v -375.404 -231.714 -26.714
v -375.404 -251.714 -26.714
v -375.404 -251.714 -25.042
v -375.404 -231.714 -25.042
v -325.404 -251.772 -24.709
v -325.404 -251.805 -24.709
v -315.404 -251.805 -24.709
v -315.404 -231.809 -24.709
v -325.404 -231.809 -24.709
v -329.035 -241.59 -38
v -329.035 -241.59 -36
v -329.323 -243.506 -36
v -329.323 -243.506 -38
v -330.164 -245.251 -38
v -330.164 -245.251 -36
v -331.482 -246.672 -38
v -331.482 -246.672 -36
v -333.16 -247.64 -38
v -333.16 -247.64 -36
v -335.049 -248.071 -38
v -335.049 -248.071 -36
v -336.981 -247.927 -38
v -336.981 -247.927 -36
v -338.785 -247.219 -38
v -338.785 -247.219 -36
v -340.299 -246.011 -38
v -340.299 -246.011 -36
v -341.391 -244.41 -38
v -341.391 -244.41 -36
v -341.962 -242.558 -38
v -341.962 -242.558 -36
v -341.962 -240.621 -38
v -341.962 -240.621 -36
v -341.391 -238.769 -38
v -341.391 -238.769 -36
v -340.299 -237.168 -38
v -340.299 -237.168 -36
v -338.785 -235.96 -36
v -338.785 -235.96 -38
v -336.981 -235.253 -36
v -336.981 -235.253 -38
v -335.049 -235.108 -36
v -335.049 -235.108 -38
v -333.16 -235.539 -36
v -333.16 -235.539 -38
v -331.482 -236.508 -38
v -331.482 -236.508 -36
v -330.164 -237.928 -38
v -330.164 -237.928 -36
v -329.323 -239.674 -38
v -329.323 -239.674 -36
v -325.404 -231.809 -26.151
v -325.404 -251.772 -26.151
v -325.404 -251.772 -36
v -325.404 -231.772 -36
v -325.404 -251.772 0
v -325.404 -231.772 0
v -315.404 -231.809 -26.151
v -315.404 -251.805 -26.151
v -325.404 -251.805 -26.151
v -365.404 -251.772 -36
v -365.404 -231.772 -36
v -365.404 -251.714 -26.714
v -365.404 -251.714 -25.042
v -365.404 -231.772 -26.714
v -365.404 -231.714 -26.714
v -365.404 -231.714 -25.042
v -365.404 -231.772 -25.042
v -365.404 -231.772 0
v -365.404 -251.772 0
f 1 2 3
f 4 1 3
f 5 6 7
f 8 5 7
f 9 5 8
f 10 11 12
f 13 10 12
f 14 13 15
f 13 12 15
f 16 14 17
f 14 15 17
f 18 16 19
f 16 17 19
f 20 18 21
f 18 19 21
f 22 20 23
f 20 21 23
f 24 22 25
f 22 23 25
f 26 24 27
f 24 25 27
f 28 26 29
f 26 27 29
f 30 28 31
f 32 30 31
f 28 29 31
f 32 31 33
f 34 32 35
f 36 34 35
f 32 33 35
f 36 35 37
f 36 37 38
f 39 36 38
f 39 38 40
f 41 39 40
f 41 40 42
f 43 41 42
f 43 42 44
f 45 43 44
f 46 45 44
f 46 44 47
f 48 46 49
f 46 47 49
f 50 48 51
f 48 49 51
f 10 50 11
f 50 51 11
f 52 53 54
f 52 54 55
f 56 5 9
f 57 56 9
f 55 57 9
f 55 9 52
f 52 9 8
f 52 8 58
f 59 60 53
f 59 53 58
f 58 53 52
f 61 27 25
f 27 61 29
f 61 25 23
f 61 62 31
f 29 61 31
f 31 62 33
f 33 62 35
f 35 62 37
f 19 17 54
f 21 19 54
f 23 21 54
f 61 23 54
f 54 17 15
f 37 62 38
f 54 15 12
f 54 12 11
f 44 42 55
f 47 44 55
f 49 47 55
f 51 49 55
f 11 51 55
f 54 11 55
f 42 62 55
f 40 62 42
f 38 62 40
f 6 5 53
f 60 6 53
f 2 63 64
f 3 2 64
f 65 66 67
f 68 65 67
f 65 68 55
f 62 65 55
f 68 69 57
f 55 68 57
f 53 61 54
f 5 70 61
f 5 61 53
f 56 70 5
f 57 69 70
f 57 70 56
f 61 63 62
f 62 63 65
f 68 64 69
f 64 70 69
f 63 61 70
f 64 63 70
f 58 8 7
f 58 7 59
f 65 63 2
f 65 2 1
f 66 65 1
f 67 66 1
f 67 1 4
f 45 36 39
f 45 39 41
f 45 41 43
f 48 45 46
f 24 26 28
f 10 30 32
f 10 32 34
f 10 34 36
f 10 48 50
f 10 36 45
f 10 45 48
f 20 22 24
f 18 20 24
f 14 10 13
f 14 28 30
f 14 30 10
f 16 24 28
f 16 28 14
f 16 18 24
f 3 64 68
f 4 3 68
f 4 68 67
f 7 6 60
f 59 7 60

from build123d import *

# Parameters (mm, degrees)
SKETCH_1_W      = 40
SKETCH_1_H      = 20
EXTRUDE_1_DEPTH = 36
SKETCH_2_W      = 1.671860453
SKETCH_2_H      = 20
EXTRUDE_2_DEPTH = 10
SKETCH_5_W      = 1.442469022
SKETCH_5_H      = 19.996010925
EXTRUDE_5_DEPTH = 10
SKETCH_7_R      = 6.5
EXTRUDE_6_DEPTH = 2


with BuildPart() as part:
    # 草图1 → 凸台-拉伸1 (new body)
    with BuildSketch(Plane.XY):
        with Locations((-345.403508772, -241.771929825)):
            Rectangle(SKETCH_1_W, SKETCH_1_H)
    extrude(amount=-EXTRUDE_1_DEPTH)

    # 草图2 → 凸台-拉伸2 (add)
    with BuildSketch(Plane(origin=(-365.403508772, 0, -0.001996536), x_dir=(0, 0, 1), z_dir=(-1, 0, 0))):
        with Locations((-25.87591575, -241.714058127)):
            Rectangle(SKETCH_2_W, SKETCH_2_H)
    extrude(amount=EXTRUDE_2_DEPTH)

    # 草图5 → 凸台-拉伸5 (add)
    with BuildSketch(Plane(origin=(-325.403508772, 0, -0.752936531), x_dir=(0, 0, -1), z_dir=(1, 0, 0))):
        with Locations((24.676802168, -241.807464448)):
            Rectangle(SKETCH_5_W, SKETCH_5_H)
    extrude(amount=EXTRUDE_5_DEPTH)

    # 草图7 → 凸台-拉伸6 (add)
    with BuildSketch(Plane(origin=(-2.226236695, -0.840173037, -36), x_dir=(-1, 0, 0), z_dir=(0, 0, -1))):
        with Locations(Location((333.308396358, -240.749438329, 0), (0, 0, 180))):
            Circle(SKETCH_7_R)
    extrude(amount=EXTRUDE_6_DEPTH)


solid = part.part
